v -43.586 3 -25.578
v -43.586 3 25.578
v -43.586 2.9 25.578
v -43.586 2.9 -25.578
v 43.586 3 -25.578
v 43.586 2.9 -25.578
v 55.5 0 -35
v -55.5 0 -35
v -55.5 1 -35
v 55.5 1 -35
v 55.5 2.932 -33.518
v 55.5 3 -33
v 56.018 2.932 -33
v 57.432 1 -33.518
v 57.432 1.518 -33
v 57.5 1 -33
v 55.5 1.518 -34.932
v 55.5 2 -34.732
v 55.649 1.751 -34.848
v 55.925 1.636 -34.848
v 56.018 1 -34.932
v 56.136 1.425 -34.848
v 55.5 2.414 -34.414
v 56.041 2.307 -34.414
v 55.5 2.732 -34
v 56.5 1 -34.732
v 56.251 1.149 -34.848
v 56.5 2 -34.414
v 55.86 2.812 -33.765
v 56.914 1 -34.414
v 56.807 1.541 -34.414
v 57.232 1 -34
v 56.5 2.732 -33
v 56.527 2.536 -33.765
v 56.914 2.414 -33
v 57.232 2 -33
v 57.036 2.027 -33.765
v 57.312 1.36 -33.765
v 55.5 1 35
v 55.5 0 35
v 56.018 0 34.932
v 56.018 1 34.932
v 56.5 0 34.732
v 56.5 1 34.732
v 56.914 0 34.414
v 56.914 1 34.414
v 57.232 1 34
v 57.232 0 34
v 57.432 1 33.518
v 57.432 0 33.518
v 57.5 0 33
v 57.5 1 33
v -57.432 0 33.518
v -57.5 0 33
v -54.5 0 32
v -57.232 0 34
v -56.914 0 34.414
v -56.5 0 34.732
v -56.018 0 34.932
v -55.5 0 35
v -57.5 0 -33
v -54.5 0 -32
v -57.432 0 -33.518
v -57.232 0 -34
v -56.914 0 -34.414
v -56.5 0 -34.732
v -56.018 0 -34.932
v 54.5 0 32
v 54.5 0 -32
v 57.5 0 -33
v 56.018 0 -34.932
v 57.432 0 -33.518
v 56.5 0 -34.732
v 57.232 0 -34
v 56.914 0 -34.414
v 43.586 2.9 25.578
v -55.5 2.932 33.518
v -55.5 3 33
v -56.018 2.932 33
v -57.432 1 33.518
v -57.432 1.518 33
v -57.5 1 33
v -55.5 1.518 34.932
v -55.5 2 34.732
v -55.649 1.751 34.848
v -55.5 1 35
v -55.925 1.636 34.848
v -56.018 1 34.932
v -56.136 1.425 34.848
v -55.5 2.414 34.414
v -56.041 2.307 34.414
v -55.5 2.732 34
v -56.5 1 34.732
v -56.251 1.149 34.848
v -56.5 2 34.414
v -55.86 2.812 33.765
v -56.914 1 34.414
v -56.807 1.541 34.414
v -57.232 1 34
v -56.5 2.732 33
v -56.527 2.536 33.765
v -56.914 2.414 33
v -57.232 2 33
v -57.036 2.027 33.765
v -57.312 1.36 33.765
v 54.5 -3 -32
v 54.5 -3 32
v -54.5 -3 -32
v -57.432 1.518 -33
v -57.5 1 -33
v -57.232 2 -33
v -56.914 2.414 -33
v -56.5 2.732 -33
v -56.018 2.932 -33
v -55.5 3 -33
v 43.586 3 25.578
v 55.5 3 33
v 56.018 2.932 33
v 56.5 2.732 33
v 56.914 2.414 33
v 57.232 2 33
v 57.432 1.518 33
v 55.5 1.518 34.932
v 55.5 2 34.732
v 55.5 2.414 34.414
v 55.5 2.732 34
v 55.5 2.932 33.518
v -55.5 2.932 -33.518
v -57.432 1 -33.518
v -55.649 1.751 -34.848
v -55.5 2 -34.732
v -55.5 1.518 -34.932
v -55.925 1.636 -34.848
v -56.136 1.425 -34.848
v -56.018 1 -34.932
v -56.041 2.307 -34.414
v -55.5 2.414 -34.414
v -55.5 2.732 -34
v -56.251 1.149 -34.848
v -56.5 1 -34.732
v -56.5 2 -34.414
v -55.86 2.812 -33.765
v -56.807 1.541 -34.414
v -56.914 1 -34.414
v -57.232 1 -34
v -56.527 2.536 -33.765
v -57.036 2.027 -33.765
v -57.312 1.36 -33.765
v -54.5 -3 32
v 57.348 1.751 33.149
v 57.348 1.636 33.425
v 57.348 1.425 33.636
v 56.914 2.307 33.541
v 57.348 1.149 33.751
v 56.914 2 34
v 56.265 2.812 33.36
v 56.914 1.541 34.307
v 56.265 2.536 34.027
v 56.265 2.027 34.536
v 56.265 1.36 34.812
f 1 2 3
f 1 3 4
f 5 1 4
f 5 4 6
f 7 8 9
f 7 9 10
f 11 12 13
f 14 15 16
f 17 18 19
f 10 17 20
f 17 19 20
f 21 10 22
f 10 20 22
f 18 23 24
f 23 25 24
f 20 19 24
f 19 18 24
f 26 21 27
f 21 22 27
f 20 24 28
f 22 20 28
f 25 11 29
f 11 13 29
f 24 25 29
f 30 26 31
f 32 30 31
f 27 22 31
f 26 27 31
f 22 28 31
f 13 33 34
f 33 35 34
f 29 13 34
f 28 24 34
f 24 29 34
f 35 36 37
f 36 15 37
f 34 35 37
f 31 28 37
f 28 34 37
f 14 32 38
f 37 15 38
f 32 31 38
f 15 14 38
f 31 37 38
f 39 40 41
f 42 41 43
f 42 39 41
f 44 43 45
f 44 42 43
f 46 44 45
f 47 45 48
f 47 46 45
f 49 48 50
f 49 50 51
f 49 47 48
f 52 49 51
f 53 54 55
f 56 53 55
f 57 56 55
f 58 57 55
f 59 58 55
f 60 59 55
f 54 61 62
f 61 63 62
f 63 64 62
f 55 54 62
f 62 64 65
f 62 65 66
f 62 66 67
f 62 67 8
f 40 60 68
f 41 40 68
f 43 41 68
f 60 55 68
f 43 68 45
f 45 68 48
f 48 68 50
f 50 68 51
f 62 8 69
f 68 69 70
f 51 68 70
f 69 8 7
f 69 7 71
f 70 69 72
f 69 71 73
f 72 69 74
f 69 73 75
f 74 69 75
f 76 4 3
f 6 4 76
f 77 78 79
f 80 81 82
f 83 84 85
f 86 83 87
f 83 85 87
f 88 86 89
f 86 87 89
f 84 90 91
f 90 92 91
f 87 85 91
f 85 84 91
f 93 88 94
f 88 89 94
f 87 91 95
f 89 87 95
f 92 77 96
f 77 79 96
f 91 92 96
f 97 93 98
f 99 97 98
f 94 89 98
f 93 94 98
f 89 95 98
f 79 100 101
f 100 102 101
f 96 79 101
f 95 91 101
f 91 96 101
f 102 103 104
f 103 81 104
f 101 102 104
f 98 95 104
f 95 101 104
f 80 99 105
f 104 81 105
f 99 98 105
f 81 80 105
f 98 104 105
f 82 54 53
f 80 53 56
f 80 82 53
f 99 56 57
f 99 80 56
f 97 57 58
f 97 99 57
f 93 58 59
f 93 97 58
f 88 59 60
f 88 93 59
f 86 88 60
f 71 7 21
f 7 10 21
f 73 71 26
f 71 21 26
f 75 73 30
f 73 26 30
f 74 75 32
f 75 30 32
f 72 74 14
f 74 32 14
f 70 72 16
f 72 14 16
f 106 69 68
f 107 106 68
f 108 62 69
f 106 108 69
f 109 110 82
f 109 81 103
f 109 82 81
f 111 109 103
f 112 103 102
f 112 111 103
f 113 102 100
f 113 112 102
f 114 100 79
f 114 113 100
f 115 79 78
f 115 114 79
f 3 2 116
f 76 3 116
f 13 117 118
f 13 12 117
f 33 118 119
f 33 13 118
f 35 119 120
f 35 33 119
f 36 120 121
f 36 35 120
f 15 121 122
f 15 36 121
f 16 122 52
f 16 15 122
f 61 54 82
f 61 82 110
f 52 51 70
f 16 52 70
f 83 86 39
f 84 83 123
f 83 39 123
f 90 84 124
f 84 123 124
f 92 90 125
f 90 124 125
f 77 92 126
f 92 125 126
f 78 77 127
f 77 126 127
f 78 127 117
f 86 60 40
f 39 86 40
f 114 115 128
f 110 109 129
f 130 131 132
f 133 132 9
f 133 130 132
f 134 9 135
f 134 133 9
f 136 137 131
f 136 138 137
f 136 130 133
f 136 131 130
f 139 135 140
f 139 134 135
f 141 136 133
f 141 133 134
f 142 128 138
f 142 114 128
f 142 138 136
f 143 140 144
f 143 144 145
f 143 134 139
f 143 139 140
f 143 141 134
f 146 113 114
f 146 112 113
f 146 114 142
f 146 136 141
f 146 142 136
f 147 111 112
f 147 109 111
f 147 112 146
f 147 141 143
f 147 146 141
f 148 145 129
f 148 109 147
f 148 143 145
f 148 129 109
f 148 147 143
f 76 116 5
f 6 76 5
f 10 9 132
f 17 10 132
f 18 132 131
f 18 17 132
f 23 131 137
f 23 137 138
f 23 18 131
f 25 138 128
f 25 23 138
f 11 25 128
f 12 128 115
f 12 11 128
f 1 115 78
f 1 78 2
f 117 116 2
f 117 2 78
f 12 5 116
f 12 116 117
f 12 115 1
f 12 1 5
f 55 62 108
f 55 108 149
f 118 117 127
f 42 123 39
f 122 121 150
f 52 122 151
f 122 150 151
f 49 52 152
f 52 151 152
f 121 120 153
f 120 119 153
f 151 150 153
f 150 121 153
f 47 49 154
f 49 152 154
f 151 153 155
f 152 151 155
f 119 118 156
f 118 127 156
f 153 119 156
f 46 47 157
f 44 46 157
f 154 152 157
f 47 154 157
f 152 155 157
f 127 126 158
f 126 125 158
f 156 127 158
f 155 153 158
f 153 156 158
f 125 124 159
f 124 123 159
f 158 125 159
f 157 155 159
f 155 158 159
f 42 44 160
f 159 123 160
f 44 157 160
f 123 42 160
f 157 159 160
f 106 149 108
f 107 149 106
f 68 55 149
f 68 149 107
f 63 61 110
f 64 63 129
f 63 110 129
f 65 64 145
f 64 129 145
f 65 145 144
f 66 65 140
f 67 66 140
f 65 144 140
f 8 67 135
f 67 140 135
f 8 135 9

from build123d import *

# Parameters (mm, degrees)
SKETCH1_W           = 115
SKETCH1_H           = 70
BOSS_EXTRUDE1_DEPTH = 3
SKETCH2_W           = 109
SKETCH2_H           = 64
BOSS_EXTRUDE2_DEPTH = 3
FILLET1_R           = 2
SKETCH4_W           = 87.172440104
SKETCH4_H           = 51.155574538
CUT_EXTRUDE1_DEPTH  = 0.1


with BuildPart() as part:
    # Sketch1 → Boss-Extrude1 (new body)
    with BuildSketch(Plane(origin=(0, 0, 0), x_dir=(1, 0, 0), z_dir=(0, 1, 0))):
        Rectangle(SKETCH1_W, SKETCH1_H)
    extrude(amount=BOSS_EXTRUDE1_DEPTH)

    # Sketch2 → Boss-Extrude2 (add)
    with BuildSketch(Plane.XZ):
        Rectangle(SKETCH2_W, SKETCH2_H)
    extrude(amount=BOSS_EXTRUDE2_DEPTH)

    # Fillet1
    fillet1_edges = [part.edges().sort_by_distance(p)[0] for p in [
        (-57.5, 3, 0),
        (0, 3, 35),
        (57.5, 3, 0),
        (0, 3, -35),
        (57.5, 1.5, 35),
        (-57.5, 1.5, 35),
        (-57.5, 1.5, -35),
        (57.5, 1.5, -35),
    ]]
    fillet(fillet1_edges, radius=FILLET1_R)

    # Sketch4 → Cut-Extrude1 (cut)
    with BuildSketch(Plane(origin=(0, 3, 0), x_dir=(1, 0, 0), z_dir=(0, 1, 0))):
        Rectangle(SKETCH4_W, SKETCH4_H)
    extrude(amount=-CUT_EXTRUDE1_DEPTH, mode=Mode.SUBTRACT)


solid = part.part
